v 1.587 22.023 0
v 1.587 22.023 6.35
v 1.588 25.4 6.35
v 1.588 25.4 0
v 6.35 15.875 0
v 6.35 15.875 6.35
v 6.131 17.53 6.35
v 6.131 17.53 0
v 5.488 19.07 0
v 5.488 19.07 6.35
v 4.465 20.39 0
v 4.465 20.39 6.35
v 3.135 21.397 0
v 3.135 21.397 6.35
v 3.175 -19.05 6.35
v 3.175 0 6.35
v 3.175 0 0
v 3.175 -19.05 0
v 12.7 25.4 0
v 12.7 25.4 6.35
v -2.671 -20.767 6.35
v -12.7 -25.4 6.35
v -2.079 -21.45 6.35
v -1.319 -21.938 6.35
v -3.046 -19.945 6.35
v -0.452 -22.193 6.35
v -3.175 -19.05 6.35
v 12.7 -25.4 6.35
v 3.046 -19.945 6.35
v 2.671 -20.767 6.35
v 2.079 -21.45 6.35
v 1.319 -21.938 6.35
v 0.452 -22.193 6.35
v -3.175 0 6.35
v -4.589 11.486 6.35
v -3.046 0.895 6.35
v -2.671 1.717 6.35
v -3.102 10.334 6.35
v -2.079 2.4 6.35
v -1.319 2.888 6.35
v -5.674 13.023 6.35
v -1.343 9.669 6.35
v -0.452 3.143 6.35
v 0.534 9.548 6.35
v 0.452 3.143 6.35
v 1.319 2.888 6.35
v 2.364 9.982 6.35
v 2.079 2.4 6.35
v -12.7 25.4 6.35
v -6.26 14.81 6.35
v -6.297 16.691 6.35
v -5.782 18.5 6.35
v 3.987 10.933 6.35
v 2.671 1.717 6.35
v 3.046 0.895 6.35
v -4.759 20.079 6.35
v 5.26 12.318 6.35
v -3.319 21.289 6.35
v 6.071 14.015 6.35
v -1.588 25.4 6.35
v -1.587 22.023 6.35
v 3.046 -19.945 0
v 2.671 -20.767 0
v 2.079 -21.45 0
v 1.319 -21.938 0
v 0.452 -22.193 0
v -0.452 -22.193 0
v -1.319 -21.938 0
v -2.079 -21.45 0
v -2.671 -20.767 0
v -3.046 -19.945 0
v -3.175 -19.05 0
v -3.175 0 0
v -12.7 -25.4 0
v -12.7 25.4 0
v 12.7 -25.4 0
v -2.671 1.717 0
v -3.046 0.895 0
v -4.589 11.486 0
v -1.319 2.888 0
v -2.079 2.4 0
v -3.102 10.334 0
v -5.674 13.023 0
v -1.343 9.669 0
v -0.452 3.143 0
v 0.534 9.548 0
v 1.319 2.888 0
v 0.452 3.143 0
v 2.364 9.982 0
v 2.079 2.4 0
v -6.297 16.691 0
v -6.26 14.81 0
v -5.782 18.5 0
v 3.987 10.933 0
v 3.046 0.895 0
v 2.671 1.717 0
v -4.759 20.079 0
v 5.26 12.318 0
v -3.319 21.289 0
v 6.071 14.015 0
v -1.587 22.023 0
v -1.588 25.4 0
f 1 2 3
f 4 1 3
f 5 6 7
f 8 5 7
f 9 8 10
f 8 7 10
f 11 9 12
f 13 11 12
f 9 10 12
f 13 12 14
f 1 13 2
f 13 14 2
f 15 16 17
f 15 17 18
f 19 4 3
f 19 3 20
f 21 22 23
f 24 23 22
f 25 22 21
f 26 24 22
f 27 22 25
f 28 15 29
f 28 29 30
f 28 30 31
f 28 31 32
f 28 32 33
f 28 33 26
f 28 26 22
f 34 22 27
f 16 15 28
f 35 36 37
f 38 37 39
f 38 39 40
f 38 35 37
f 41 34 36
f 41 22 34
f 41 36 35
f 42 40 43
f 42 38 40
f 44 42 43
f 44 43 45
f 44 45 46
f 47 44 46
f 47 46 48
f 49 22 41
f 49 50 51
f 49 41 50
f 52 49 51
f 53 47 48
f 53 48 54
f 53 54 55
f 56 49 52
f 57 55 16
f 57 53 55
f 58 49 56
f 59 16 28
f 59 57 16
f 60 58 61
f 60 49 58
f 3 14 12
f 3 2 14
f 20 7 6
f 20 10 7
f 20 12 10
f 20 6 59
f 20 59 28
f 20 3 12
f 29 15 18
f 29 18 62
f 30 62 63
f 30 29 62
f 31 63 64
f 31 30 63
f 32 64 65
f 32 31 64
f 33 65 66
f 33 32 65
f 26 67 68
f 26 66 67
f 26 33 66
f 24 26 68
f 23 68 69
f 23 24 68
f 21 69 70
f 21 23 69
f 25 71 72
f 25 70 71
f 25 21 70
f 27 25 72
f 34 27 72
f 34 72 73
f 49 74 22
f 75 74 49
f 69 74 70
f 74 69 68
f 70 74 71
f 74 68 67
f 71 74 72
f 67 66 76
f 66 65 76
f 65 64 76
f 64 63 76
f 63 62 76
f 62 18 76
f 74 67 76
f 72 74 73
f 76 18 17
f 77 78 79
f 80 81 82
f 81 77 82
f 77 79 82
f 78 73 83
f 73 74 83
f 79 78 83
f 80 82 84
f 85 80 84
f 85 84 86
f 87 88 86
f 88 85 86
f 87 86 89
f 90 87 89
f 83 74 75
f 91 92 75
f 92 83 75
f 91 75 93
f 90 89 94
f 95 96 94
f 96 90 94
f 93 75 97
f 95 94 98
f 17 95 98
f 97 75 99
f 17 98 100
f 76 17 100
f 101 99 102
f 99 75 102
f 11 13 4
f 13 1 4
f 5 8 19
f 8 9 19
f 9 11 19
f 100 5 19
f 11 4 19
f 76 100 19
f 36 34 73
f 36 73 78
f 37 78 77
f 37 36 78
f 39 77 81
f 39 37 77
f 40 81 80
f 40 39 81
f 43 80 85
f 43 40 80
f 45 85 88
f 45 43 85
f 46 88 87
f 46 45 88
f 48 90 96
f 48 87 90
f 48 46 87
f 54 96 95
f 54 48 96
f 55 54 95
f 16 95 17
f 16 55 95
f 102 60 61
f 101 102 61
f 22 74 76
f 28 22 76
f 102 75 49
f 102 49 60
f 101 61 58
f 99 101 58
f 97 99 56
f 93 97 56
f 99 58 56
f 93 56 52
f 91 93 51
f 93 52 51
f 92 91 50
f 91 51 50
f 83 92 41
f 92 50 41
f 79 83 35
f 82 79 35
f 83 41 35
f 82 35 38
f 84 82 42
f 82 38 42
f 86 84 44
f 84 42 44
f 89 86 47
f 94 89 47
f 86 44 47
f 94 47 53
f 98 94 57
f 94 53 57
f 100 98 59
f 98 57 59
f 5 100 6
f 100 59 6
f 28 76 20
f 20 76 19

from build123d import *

# Parameters (mm, degrees)
SKETCH1_W           = 25.4
SKETCH1_H           = 50.8
BOSS_EXTRUDE1_DEPTH = 6.35
CUT_EXTRUDE1_DEPTH  = 30.099355663
CUT_EXTRUDE2_DEPTH  = 30.099355663


with BuildPart() as part:
    # Sketch1 → Boss-Extrude1 (new body)
    with BuildSketch(Plane.XY):
        Rectangle(SKETCH1_W, SKETCH1_H)
    extrude(amount=BOSS_EXTRUDE1_DEPTH)

    # Sketch2 → Cut-Extrude1 (cut, through all)
    with BuildSketch(Plane.XY.offset(6.35)):
        with BuildLine():
            Line((-1.5875, 22.023361062), (-1.5875, 14.440204949))
            Line((-1.5875, 14.440204949), (1.5875, 14.440204949))
            Line((1.5875, 14.440204949), (1.5875, 22.023361062))
            ThreePointArc((1.5875, 22.023361062), (0, 22.225), (-1.5875, 22.023361062))
        make_face()
        with BuildLine():
            Line((1.5875, 14.440204949), (-1.5875, 14.440204949))
            Line((-1.5875, 14.440204949), (-1.5875, 22.023361062))
            ThreePointArc((-1.5875, 22.023361062), (-3.888564967, 10.854884214), (6.35, 15.875))
            ThreePointArc((6.35, 15.875), (5.020115786, 19.763564967), (1.5875, 22.023361062))
            Line((1.5875, 22.023361062), (1.5875, 14.440204949))
        make_face()
        with BuildLine():
            Line((-1.5875, 25.4), (-1.5875, 22.023361062))
            ThreePointArc((-1.5875, 22.023361062), (0, 22.225), (1.5875, 22.023361062))
            Line((1.5875, 22.023361062), (1.5875, 25.4))
            Line((1.5875, 25.4), (-1.5875, 25.4))
        make_face()
    extrude(amount=-CUT_EXTRUDE1_DEPTH, mode=Mode.SUBTRACT)

    # Sketch3 → Cut-Extrude2 (cut, through all)
    with BuildSketch(Plane.XY.offset(6.35)):
        with BuildLine():
            Line((-3.175, -19.05), (-3.175, 0))
            ThreePointArc((-3.175, 0), (0, 3.175), (3.175, 0))
            Line((3.175, 0), (3.175, -19.05))
            ThreePointArc((3.175, -19.05), (0, -22.225), (-3.175, -19.05))
        make_face()
    extrude(amount=-CUT_EXTRUDE2_DEPTH, mode=Mode.SUBTRACT)


solid = part.part
